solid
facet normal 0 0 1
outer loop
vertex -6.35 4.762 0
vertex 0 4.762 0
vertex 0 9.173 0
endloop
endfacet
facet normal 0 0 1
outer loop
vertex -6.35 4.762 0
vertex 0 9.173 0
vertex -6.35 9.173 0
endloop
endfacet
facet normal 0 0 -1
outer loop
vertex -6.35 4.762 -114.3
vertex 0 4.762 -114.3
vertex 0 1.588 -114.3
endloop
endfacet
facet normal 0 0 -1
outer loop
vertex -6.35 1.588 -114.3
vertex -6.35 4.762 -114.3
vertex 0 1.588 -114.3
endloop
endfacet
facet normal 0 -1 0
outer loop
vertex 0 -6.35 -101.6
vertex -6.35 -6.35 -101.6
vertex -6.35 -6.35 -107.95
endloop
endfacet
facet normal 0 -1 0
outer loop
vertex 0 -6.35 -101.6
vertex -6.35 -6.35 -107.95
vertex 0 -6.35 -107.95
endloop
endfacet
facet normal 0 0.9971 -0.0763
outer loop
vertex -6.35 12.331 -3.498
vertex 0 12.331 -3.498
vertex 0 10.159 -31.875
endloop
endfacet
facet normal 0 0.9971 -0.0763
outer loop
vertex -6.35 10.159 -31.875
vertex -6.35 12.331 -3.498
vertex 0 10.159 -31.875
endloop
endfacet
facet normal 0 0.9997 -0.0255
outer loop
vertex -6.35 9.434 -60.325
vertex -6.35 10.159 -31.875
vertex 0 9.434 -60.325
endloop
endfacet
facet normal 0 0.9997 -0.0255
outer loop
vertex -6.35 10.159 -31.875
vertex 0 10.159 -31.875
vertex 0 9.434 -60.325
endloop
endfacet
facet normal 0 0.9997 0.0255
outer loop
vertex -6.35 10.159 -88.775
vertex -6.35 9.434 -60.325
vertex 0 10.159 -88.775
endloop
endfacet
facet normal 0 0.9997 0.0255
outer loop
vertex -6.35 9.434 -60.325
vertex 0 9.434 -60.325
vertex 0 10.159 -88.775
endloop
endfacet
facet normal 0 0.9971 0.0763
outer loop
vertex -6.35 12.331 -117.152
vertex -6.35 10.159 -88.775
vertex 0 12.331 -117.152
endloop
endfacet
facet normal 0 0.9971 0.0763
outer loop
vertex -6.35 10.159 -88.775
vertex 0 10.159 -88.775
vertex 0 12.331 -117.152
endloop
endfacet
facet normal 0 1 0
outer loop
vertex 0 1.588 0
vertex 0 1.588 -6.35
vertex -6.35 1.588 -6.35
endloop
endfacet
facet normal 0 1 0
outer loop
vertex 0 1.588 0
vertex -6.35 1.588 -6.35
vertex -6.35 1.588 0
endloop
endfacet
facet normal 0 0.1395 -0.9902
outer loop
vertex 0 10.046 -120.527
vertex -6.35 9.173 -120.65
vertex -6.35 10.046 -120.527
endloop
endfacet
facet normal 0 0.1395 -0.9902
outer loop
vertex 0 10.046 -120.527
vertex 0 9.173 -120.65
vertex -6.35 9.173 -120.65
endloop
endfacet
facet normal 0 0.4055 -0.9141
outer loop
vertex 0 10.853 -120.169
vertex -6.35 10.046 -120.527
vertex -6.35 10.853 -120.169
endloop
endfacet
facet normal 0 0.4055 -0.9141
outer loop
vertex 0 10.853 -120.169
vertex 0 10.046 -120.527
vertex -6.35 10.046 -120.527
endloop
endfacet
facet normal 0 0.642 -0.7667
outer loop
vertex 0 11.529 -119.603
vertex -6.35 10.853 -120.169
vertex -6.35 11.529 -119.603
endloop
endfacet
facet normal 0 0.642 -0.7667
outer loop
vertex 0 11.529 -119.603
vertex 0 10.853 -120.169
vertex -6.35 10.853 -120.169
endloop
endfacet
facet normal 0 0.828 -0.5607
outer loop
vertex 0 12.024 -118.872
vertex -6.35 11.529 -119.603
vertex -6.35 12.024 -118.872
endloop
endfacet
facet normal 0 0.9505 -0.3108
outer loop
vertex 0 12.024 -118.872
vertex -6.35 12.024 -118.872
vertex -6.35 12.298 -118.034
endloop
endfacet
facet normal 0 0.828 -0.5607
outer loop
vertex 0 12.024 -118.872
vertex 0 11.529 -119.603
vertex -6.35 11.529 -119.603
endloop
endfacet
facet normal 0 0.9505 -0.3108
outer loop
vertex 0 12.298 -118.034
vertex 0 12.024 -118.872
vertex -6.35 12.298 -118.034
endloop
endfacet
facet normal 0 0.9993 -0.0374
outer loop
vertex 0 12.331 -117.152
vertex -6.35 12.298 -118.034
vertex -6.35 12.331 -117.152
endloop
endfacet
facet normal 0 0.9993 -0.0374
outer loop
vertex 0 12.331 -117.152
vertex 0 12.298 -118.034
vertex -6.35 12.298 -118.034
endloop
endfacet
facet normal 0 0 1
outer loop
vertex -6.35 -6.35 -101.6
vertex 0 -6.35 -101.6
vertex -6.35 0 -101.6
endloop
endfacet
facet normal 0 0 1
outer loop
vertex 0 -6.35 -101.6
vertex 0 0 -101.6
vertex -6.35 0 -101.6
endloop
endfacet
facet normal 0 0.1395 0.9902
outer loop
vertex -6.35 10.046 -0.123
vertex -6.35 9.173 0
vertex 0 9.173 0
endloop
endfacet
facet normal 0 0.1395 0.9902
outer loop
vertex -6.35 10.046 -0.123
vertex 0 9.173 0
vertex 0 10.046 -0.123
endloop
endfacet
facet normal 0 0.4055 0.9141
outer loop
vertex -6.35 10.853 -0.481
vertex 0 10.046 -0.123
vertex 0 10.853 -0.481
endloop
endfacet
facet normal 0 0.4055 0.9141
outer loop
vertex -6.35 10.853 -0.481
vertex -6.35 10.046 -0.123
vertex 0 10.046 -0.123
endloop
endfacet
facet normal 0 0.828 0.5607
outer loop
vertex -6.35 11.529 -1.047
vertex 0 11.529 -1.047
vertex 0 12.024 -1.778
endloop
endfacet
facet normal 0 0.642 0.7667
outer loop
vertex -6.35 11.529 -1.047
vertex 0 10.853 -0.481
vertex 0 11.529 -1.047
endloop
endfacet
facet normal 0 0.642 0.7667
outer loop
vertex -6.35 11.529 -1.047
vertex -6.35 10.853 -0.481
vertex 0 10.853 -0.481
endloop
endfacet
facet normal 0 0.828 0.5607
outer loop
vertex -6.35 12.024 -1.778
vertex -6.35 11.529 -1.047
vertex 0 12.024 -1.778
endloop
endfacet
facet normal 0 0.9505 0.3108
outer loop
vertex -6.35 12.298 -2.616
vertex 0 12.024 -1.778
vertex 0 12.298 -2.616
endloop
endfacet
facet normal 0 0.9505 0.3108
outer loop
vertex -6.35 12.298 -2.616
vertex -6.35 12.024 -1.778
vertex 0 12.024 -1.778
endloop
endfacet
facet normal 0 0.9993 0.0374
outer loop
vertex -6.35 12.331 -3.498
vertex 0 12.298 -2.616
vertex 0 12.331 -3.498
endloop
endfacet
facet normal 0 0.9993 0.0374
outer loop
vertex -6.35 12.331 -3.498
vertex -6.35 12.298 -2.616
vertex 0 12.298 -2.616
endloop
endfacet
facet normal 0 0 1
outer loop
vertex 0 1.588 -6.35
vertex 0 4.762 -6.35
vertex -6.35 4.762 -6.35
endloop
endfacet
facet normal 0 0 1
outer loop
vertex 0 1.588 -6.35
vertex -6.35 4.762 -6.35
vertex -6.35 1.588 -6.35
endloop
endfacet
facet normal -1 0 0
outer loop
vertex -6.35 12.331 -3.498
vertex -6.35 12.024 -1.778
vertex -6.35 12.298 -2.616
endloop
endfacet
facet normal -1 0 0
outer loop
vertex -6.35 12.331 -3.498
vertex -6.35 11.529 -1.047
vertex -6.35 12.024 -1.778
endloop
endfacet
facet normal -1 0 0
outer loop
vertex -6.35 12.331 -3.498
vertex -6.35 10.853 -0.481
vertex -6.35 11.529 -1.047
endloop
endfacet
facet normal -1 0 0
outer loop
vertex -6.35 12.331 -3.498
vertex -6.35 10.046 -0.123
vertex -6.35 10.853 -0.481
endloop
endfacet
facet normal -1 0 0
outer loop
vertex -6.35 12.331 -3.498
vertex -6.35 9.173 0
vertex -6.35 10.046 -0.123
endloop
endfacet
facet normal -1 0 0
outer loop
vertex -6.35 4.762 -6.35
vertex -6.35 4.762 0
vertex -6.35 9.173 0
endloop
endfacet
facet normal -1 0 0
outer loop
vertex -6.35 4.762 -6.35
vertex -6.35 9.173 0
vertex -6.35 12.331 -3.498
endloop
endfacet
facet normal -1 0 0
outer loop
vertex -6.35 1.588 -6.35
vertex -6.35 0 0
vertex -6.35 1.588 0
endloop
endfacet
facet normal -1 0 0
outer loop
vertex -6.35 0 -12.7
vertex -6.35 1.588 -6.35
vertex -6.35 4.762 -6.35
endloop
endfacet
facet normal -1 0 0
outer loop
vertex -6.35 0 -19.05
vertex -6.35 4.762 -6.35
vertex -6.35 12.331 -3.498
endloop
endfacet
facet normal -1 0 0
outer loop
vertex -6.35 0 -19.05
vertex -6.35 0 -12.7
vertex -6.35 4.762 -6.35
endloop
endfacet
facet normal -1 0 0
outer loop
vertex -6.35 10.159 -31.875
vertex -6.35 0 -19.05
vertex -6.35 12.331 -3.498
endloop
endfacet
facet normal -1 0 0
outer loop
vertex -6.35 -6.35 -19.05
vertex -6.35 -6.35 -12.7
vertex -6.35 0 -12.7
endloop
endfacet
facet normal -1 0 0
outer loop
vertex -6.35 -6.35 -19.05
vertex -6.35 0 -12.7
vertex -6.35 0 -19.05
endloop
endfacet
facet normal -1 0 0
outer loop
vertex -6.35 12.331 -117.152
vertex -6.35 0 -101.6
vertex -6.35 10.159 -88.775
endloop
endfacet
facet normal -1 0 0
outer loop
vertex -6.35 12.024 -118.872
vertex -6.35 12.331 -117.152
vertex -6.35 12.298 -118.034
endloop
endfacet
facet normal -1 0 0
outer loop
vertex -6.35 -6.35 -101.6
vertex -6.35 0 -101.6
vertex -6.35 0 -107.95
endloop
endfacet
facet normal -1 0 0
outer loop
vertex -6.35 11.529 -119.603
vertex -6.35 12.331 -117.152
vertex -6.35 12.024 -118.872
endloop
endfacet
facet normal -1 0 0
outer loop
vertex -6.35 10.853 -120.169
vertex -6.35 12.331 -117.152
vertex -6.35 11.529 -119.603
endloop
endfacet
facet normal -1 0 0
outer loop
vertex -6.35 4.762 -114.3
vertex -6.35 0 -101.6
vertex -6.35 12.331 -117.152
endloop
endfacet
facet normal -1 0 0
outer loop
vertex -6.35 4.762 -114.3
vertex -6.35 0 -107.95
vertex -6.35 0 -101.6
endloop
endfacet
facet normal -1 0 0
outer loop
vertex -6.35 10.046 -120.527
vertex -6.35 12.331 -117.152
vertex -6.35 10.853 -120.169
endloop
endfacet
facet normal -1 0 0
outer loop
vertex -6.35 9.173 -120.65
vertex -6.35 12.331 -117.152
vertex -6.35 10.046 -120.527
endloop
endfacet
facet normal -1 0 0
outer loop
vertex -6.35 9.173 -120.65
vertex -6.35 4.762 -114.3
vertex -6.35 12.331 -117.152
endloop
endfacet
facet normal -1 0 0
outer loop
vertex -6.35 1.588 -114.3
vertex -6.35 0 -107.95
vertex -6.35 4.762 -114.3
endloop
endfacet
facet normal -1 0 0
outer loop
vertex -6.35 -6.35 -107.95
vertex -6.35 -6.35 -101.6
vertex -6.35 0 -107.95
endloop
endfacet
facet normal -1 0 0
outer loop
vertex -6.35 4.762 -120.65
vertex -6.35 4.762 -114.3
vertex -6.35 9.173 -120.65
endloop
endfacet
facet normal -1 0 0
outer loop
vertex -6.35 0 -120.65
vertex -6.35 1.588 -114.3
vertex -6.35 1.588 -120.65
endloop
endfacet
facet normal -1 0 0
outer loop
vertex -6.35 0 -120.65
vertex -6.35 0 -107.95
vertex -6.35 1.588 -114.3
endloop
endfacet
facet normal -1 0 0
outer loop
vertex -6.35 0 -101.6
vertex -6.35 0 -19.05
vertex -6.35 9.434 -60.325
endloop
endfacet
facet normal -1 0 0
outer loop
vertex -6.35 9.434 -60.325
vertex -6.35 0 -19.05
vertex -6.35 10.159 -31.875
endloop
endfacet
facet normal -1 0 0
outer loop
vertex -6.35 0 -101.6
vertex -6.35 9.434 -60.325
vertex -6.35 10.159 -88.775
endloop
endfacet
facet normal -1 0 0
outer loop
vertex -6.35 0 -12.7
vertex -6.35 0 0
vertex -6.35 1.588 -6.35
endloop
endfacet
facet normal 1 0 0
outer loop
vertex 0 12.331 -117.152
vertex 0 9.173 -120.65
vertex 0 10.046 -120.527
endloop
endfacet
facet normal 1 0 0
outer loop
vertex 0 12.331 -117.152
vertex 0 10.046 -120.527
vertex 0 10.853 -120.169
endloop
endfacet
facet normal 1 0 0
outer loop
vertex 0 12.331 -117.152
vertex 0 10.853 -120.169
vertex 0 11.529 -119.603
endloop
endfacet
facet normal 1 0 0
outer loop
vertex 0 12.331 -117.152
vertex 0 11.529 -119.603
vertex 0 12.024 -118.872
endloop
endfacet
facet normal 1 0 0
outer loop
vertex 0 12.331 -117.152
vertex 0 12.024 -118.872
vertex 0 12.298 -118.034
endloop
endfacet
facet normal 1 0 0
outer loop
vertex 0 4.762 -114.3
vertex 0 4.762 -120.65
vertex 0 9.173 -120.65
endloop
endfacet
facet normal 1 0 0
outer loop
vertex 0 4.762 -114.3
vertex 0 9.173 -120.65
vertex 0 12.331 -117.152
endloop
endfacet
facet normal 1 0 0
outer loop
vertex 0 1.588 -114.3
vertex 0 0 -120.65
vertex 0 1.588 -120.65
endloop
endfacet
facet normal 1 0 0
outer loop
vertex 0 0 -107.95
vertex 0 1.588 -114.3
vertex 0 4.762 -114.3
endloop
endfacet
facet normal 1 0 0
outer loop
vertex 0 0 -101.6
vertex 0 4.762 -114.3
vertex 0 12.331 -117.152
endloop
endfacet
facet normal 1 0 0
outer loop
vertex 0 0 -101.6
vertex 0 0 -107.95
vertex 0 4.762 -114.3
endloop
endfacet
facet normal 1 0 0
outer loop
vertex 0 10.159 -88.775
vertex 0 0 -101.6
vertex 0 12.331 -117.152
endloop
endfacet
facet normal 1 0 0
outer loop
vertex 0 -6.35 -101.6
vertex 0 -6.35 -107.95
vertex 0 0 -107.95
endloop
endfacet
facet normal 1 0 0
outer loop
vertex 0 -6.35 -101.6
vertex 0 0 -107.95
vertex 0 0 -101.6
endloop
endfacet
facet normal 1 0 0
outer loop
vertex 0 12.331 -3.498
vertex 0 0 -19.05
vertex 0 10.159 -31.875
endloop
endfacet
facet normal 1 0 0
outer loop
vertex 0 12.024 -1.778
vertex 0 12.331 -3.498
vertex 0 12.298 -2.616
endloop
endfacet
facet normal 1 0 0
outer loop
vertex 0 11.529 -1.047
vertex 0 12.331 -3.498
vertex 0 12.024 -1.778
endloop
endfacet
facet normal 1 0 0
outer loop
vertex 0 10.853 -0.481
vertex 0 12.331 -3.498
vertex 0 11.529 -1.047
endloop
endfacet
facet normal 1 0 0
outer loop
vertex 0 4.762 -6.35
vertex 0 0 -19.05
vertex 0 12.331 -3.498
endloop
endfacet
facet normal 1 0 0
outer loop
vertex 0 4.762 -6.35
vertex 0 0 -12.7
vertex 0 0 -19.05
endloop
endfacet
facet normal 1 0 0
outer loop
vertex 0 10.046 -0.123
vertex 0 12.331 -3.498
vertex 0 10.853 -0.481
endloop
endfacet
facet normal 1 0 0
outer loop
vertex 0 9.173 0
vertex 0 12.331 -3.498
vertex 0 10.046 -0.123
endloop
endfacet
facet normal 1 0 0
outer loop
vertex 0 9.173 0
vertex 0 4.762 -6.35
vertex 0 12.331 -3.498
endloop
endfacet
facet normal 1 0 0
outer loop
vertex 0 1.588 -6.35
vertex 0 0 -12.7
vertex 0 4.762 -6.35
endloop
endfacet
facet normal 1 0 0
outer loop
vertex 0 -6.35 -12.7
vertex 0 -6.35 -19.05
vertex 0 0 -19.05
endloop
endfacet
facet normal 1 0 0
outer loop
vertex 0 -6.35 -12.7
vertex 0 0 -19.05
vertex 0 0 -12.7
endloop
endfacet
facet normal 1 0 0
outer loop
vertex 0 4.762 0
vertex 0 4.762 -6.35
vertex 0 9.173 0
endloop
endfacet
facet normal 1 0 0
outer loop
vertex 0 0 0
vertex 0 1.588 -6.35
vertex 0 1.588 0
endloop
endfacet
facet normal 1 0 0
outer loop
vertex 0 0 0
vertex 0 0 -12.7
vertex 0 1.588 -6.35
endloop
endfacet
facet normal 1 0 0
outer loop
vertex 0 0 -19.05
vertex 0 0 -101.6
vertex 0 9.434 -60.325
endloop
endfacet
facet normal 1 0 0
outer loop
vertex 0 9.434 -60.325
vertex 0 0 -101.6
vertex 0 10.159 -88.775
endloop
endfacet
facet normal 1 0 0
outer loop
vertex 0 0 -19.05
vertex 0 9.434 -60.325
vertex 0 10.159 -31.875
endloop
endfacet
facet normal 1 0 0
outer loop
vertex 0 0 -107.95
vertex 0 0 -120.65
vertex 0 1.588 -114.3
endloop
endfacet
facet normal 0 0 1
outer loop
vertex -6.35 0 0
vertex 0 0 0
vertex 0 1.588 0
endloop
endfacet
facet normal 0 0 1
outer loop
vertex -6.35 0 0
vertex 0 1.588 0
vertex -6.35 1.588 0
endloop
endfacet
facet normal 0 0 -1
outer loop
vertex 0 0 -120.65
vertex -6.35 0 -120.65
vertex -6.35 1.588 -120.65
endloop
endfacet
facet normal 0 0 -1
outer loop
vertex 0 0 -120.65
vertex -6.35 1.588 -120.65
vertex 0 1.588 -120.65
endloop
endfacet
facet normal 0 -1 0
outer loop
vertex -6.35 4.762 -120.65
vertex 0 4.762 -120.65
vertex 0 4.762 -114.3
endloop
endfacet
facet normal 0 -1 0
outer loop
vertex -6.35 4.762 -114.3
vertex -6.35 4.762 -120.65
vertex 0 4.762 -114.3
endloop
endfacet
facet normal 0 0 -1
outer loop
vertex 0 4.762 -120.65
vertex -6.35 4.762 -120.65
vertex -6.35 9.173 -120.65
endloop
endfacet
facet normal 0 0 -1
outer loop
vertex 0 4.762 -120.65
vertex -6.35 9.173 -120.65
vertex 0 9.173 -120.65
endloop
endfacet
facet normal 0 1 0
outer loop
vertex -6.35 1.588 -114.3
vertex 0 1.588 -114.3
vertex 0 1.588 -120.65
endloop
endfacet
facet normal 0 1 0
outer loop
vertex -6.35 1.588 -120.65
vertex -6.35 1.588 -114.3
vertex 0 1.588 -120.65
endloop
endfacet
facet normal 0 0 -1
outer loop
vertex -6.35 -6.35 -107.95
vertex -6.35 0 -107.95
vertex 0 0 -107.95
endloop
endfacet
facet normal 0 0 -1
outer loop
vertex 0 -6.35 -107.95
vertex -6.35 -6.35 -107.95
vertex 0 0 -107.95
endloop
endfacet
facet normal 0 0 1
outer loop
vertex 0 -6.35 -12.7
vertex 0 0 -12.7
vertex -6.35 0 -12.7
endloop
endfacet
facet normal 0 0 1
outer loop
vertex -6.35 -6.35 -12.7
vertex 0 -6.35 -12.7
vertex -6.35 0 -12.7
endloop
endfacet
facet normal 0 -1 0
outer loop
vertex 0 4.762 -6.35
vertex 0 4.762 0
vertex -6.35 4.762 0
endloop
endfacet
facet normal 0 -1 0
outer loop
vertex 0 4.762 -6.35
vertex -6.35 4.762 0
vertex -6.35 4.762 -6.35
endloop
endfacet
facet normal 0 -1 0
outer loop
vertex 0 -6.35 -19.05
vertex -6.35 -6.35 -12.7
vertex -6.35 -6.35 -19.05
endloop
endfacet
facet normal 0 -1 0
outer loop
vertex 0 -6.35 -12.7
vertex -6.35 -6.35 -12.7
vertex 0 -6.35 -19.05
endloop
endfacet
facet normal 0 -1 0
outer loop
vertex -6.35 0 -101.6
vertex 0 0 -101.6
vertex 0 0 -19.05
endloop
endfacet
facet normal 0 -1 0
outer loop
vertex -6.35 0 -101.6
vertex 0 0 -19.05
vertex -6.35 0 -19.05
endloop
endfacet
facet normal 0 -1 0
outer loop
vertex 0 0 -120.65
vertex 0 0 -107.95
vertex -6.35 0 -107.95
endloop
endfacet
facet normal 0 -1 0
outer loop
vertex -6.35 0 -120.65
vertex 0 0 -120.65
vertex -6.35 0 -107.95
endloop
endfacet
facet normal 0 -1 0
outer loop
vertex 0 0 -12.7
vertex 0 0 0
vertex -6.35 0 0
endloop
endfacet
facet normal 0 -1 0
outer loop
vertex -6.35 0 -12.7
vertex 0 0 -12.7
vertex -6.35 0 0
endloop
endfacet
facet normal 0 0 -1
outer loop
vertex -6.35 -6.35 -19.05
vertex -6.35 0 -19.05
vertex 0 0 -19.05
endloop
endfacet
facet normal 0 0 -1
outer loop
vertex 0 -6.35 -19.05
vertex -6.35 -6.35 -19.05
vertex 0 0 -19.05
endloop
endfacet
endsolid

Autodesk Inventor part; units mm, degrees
ref_plane "YZ Plane" through (0, 0, 0) normal (1, 0, 0) x (0, 1, 0)
ref_plane "XZ Plane" through (0, 0, 0) normal (0, 1, 0) x (-1, 0, 0)
ref_plane "XY Plane" through (0, 0, 0) normal (0, 0, 1) x (1, 0, 0)
sketch "Sketch1" plane through (0, 0, 0) normal (0, 1, 0) x (-1, 0, 0)
  line L0 (0, 0) -> (6.35, 0)
  line L1 (6.35, 0) -> (6.35, -120.65)
  line L2 (6.35, -120.65) -> (0, -120.65)
  line L3 (0, -120.65) -> (0, 0)
  dimension "d0" = 120.65
  dimension "d1" = 6.35
extrude "Extrusion1" add sketch "Sketch1" along normal blind 12.7
sketch "Sketch2" plane through (0, 0, 0) normal (0, -1, 0) x (1, 0, 0)
  line L0 (0, 0) -> (0, -120.65) projected
  line L1 (-6.35, -120.65) -> (-6.35, 0) projected
  line L2 (0, -12.7) -> (-6.35, -12.7)
  line L3 (-6.35, -12.7) -> (-6.35, -19.05)
  line L4 (-6.35, -19.05) -> (0, -19.05)
  line L5 (0, -19.05) -> (0, -12.7)
  line L6 (0, -101.6) -> (-6.35, -101.6)
  line L7 (-6.35, -101.6) -> (-6.35, -107.95)
  line L8 (-6.35, -107.95) -> (0, -107.95)
  line L9 (0, -107.95) -> (0, -101.6)
  line L10 (-6.35, -120.65) -> (0, -120.65) projected
  line L11 (0, 0) -> (-6.35, 0) projected
  dimension "d4" = 6.35
  dimension "d5" = 12.7
  dimension "d6" = 12.7
  dimension "d7" = 6.35
extrude "Extrusion2" add sketch "Sketch2" along normal blind 6.35 contours L0 L4 L1 L2 | L0 L8 L1 L6
sketch "Sketch3" plane through (0, 0, -120.65) normal (1, 0, 0) x (0, 0, -1)
  line L0 (-120.65, 0) -> (-120.65, 12.7) projected
  line L1 (-120.65, 4.7625) -> (-114.3, 4.7625)
  line L2 (-114.3, 4.7625) -> (-114.3, 1.5875)
  line L3 (-114.3, 1.5875) -> (-120.65, 1.5875)
  line L4 (-120.65, 1.5875) -> (-120.65, 4.7625)
  line L5 (0, 0) -> (0, 12.7) projected
  line L6 (0, 4.7625) -> (-6.35, 4.7625)
  line L7 (-6.35, 4.7625) -> (-6.35, 1.5875)
  line L8 (-6.35, 1.5875) -> (0, 1.5875)
  line L9 (0, 1.5875) -> (0, 4.7625)
  line L10 (-107.95, 0) -> (-120.65, 0) projected
  dimension "d10" = 6.35
  dimension "d11" = 3.175
  dimension "d12" = 1.5875
  dimension "d13" = 6.35
extrude "Extrusion3" cut sketch "Sketch3" against normal blind 6.35
sketch "Sketch4" plane through (0, 12.7, 0) normal (1, 0, 0) x (0, 0, -1)
  line L0 (0, -7.9375) -> (0, 0) projected
  line L1 (120.65, -7.9375) -> (120.65, 0) projected
  arc A0 (0, 0) -> (120.65, 0) centre (60.325, 555.5343) ccw
  line L2 (120.65, 0) -> (0, 0) projected
  line L3 (0, 0) -> (120.65, 0)
  point P0 (0, -12.7)
  dimension "d16" = 558.8
extrude "Extrusion4" cut sketch "Sketch4" against normal blind 6.35
fillet "Fillet1" radius 3.175 2 edges at (-3.175, 12.7, 0) (-3.175, 12.7, -120.65)
properties part number "MonsterHolderSupport2"
